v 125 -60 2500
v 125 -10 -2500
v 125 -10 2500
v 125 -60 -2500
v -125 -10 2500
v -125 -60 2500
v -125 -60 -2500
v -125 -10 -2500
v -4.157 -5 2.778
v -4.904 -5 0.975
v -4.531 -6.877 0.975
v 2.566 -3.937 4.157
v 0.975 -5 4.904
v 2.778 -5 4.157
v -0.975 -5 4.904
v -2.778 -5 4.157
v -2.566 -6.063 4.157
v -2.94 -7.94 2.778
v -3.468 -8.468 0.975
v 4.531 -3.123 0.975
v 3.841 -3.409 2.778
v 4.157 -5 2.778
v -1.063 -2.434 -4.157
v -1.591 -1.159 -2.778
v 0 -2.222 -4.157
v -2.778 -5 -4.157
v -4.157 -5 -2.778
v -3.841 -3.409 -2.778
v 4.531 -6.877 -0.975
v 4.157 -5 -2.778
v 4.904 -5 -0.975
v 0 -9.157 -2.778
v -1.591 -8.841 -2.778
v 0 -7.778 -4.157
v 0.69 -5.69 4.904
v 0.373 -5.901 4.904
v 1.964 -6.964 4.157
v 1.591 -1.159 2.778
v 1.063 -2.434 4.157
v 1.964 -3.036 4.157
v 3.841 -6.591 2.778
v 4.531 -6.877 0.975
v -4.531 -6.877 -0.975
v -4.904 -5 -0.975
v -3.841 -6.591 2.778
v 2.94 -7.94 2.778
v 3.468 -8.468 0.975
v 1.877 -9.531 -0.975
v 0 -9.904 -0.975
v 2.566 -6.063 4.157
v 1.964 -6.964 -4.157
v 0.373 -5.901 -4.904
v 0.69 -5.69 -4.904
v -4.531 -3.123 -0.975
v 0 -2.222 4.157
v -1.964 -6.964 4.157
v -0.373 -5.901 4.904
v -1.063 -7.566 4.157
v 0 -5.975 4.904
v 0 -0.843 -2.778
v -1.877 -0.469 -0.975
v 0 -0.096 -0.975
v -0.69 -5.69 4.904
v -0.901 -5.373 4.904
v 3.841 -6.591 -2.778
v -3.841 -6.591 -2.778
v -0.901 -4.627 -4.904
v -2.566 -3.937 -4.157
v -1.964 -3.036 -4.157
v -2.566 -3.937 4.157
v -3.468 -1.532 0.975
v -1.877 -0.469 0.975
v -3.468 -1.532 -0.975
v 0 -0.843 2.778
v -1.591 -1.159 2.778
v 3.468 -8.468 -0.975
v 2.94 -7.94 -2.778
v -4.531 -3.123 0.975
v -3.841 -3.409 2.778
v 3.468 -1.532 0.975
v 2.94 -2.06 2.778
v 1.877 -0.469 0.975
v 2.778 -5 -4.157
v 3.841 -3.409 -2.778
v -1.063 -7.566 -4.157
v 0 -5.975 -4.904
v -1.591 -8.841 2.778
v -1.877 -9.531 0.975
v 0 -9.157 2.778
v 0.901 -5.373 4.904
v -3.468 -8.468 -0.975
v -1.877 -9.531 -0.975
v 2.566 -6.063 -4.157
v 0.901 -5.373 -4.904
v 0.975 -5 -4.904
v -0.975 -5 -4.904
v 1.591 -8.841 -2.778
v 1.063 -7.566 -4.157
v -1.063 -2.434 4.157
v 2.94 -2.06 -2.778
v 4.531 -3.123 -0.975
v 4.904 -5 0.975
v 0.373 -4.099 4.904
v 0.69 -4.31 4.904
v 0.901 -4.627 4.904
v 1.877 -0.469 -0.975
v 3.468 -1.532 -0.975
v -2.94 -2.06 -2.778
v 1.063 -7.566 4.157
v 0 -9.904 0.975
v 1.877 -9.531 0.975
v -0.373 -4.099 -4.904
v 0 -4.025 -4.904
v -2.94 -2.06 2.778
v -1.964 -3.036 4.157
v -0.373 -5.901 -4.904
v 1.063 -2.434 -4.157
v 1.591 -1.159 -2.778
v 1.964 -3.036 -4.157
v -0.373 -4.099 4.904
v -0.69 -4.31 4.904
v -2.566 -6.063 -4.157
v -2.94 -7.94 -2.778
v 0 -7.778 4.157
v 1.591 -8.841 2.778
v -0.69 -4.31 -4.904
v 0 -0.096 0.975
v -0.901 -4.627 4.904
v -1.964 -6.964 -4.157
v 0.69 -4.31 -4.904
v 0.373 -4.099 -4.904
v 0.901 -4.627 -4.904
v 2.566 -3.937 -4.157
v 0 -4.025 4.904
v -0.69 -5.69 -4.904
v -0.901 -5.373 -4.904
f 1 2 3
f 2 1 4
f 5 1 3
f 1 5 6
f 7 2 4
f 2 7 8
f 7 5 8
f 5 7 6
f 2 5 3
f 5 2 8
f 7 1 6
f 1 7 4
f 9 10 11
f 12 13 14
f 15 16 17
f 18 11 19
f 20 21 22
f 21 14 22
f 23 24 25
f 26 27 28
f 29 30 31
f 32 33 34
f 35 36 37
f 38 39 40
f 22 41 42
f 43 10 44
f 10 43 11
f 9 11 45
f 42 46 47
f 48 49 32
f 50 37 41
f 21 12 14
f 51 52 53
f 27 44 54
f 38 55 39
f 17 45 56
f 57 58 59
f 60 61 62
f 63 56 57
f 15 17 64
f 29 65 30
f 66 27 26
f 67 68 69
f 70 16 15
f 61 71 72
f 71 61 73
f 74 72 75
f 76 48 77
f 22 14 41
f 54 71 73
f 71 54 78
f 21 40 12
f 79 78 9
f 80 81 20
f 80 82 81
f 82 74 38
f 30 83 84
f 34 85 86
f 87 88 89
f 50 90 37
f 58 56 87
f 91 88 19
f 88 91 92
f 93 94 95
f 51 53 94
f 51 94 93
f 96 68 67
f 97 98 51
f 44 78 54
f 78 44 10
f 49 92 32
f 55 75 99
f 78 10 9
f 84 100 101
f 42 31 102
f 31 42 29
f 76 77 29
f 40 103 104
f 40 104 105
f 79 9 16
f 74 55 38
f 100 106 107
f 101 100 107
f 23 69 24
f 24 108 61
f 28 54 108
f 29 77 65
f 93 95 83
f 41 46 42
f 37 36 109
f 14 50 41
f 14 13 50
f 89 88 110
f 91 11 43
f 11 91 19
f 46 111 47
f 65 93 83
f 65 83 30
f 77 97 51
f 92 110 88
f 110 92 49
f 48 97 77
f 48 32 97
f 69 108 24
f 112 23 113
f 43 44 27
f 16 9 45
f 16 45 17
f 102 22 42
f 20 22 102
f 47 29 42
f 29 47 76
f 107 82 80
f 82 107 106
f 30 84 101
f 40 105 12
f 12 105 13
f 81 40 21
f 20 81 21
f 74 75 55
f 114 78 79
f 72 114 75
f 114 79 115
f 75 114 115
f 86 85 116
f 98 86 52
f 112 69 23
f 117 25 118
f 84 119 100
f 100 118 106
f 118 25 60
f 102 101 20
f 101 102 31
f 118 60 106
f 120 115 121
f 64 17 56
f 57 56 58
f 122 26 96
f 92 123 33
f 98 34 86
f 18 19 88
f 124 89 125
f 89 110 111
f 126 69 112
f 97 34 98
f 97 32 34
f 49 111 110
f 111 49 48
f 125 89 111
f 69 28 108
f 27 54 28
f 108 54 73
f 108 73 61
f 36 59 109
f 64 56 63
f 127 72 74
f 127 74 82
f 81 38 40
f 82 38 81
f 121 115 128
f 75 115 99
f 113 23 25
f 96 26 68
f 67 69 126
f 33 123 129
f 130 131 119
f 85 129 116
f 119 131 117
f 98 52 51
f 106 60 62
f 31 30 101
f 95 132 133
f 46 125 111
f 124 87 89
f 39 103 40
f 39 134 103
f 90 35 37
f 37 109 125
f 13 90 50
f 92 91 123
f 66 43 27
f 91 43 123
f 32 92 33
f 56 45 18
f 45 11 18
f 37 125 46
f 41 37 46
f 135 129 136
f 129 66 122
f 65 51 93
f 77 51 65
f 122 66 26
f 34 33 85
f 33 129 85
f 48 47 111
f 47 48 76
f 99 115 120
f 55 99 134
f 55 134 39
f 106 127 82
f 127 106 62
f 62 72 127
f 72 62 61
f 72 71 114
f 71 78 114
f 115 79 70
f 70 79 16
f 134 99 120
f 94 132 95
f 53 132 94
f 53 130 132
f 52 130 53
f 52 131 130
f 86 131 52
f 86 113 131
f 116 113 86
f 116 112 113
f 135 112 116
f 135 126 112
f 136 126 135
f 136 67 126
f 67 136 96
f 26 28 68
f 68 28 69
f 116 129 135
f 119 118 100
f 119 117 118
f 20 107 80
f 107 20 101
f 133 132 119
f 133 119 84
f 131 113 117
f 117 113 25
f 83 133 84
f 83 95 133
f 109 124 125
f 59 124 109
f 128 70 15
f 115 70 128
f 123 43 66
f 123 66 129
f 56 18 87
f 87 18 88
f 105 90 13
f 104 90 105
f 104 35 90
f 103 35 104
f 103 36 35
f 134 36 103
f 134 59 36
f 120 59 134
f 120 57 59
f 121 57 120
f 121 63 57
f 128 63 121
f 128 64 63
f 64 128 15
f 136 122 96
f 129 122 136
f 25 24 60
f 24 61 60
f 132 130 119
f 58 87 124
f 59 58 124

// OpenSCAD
union(){
multmatrix( m=[[1,0,0,0],
[0,1,0,-35],
[0,0,1,0],
[0,0,0,1]]){cube([250,50,5000],true);}
multmatrix( m=[[1,0,0,0],
[0,1,0,-5],
[0,0,1,0],
[0,0,0,1]]){sphere(5,true);}
}
